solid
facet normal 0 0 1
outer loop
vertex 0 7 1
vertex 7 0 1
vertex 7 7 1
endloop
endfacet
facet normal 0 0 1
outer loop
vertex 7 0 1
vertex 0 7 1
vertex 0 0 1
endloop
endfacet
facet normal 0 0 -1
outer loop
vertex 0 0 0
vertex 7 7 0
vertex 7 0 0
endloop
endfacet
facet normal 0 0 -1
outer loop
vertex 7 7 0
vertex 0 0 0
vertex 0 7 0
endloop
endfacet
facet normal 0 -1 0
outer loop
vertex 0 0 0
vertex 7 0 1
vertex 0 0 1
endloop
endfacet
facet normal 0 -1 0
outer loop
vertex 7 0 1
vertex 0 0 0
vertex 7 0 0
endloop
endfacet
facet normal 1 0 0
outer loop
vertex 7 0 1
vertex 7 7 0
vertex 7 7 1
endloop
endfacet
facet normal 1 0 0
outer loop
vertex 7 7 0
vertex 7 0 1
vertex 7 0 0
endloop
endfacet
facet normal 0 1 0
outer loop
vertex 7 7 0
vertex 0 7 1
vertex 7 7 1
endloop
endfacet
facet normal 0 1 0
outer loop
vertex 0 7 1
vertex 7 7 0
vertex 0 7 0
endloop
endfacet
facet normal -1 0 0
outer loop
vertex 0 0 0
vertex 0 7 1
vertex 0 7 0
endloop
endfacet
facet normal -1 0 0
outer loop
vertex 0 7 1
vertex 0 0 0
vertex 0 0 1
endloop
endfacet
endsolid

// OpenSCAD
/*
 * See also:
 * https://www.nxp.com/docs/en/application-note/AN4388.pdf
 */

color_package_mold = "black";

module lqfp48()
{
    color(color_package_mold)
    cube([
        7.0,
        7.0,
        1.0
        ]);
}

lqfp48();
